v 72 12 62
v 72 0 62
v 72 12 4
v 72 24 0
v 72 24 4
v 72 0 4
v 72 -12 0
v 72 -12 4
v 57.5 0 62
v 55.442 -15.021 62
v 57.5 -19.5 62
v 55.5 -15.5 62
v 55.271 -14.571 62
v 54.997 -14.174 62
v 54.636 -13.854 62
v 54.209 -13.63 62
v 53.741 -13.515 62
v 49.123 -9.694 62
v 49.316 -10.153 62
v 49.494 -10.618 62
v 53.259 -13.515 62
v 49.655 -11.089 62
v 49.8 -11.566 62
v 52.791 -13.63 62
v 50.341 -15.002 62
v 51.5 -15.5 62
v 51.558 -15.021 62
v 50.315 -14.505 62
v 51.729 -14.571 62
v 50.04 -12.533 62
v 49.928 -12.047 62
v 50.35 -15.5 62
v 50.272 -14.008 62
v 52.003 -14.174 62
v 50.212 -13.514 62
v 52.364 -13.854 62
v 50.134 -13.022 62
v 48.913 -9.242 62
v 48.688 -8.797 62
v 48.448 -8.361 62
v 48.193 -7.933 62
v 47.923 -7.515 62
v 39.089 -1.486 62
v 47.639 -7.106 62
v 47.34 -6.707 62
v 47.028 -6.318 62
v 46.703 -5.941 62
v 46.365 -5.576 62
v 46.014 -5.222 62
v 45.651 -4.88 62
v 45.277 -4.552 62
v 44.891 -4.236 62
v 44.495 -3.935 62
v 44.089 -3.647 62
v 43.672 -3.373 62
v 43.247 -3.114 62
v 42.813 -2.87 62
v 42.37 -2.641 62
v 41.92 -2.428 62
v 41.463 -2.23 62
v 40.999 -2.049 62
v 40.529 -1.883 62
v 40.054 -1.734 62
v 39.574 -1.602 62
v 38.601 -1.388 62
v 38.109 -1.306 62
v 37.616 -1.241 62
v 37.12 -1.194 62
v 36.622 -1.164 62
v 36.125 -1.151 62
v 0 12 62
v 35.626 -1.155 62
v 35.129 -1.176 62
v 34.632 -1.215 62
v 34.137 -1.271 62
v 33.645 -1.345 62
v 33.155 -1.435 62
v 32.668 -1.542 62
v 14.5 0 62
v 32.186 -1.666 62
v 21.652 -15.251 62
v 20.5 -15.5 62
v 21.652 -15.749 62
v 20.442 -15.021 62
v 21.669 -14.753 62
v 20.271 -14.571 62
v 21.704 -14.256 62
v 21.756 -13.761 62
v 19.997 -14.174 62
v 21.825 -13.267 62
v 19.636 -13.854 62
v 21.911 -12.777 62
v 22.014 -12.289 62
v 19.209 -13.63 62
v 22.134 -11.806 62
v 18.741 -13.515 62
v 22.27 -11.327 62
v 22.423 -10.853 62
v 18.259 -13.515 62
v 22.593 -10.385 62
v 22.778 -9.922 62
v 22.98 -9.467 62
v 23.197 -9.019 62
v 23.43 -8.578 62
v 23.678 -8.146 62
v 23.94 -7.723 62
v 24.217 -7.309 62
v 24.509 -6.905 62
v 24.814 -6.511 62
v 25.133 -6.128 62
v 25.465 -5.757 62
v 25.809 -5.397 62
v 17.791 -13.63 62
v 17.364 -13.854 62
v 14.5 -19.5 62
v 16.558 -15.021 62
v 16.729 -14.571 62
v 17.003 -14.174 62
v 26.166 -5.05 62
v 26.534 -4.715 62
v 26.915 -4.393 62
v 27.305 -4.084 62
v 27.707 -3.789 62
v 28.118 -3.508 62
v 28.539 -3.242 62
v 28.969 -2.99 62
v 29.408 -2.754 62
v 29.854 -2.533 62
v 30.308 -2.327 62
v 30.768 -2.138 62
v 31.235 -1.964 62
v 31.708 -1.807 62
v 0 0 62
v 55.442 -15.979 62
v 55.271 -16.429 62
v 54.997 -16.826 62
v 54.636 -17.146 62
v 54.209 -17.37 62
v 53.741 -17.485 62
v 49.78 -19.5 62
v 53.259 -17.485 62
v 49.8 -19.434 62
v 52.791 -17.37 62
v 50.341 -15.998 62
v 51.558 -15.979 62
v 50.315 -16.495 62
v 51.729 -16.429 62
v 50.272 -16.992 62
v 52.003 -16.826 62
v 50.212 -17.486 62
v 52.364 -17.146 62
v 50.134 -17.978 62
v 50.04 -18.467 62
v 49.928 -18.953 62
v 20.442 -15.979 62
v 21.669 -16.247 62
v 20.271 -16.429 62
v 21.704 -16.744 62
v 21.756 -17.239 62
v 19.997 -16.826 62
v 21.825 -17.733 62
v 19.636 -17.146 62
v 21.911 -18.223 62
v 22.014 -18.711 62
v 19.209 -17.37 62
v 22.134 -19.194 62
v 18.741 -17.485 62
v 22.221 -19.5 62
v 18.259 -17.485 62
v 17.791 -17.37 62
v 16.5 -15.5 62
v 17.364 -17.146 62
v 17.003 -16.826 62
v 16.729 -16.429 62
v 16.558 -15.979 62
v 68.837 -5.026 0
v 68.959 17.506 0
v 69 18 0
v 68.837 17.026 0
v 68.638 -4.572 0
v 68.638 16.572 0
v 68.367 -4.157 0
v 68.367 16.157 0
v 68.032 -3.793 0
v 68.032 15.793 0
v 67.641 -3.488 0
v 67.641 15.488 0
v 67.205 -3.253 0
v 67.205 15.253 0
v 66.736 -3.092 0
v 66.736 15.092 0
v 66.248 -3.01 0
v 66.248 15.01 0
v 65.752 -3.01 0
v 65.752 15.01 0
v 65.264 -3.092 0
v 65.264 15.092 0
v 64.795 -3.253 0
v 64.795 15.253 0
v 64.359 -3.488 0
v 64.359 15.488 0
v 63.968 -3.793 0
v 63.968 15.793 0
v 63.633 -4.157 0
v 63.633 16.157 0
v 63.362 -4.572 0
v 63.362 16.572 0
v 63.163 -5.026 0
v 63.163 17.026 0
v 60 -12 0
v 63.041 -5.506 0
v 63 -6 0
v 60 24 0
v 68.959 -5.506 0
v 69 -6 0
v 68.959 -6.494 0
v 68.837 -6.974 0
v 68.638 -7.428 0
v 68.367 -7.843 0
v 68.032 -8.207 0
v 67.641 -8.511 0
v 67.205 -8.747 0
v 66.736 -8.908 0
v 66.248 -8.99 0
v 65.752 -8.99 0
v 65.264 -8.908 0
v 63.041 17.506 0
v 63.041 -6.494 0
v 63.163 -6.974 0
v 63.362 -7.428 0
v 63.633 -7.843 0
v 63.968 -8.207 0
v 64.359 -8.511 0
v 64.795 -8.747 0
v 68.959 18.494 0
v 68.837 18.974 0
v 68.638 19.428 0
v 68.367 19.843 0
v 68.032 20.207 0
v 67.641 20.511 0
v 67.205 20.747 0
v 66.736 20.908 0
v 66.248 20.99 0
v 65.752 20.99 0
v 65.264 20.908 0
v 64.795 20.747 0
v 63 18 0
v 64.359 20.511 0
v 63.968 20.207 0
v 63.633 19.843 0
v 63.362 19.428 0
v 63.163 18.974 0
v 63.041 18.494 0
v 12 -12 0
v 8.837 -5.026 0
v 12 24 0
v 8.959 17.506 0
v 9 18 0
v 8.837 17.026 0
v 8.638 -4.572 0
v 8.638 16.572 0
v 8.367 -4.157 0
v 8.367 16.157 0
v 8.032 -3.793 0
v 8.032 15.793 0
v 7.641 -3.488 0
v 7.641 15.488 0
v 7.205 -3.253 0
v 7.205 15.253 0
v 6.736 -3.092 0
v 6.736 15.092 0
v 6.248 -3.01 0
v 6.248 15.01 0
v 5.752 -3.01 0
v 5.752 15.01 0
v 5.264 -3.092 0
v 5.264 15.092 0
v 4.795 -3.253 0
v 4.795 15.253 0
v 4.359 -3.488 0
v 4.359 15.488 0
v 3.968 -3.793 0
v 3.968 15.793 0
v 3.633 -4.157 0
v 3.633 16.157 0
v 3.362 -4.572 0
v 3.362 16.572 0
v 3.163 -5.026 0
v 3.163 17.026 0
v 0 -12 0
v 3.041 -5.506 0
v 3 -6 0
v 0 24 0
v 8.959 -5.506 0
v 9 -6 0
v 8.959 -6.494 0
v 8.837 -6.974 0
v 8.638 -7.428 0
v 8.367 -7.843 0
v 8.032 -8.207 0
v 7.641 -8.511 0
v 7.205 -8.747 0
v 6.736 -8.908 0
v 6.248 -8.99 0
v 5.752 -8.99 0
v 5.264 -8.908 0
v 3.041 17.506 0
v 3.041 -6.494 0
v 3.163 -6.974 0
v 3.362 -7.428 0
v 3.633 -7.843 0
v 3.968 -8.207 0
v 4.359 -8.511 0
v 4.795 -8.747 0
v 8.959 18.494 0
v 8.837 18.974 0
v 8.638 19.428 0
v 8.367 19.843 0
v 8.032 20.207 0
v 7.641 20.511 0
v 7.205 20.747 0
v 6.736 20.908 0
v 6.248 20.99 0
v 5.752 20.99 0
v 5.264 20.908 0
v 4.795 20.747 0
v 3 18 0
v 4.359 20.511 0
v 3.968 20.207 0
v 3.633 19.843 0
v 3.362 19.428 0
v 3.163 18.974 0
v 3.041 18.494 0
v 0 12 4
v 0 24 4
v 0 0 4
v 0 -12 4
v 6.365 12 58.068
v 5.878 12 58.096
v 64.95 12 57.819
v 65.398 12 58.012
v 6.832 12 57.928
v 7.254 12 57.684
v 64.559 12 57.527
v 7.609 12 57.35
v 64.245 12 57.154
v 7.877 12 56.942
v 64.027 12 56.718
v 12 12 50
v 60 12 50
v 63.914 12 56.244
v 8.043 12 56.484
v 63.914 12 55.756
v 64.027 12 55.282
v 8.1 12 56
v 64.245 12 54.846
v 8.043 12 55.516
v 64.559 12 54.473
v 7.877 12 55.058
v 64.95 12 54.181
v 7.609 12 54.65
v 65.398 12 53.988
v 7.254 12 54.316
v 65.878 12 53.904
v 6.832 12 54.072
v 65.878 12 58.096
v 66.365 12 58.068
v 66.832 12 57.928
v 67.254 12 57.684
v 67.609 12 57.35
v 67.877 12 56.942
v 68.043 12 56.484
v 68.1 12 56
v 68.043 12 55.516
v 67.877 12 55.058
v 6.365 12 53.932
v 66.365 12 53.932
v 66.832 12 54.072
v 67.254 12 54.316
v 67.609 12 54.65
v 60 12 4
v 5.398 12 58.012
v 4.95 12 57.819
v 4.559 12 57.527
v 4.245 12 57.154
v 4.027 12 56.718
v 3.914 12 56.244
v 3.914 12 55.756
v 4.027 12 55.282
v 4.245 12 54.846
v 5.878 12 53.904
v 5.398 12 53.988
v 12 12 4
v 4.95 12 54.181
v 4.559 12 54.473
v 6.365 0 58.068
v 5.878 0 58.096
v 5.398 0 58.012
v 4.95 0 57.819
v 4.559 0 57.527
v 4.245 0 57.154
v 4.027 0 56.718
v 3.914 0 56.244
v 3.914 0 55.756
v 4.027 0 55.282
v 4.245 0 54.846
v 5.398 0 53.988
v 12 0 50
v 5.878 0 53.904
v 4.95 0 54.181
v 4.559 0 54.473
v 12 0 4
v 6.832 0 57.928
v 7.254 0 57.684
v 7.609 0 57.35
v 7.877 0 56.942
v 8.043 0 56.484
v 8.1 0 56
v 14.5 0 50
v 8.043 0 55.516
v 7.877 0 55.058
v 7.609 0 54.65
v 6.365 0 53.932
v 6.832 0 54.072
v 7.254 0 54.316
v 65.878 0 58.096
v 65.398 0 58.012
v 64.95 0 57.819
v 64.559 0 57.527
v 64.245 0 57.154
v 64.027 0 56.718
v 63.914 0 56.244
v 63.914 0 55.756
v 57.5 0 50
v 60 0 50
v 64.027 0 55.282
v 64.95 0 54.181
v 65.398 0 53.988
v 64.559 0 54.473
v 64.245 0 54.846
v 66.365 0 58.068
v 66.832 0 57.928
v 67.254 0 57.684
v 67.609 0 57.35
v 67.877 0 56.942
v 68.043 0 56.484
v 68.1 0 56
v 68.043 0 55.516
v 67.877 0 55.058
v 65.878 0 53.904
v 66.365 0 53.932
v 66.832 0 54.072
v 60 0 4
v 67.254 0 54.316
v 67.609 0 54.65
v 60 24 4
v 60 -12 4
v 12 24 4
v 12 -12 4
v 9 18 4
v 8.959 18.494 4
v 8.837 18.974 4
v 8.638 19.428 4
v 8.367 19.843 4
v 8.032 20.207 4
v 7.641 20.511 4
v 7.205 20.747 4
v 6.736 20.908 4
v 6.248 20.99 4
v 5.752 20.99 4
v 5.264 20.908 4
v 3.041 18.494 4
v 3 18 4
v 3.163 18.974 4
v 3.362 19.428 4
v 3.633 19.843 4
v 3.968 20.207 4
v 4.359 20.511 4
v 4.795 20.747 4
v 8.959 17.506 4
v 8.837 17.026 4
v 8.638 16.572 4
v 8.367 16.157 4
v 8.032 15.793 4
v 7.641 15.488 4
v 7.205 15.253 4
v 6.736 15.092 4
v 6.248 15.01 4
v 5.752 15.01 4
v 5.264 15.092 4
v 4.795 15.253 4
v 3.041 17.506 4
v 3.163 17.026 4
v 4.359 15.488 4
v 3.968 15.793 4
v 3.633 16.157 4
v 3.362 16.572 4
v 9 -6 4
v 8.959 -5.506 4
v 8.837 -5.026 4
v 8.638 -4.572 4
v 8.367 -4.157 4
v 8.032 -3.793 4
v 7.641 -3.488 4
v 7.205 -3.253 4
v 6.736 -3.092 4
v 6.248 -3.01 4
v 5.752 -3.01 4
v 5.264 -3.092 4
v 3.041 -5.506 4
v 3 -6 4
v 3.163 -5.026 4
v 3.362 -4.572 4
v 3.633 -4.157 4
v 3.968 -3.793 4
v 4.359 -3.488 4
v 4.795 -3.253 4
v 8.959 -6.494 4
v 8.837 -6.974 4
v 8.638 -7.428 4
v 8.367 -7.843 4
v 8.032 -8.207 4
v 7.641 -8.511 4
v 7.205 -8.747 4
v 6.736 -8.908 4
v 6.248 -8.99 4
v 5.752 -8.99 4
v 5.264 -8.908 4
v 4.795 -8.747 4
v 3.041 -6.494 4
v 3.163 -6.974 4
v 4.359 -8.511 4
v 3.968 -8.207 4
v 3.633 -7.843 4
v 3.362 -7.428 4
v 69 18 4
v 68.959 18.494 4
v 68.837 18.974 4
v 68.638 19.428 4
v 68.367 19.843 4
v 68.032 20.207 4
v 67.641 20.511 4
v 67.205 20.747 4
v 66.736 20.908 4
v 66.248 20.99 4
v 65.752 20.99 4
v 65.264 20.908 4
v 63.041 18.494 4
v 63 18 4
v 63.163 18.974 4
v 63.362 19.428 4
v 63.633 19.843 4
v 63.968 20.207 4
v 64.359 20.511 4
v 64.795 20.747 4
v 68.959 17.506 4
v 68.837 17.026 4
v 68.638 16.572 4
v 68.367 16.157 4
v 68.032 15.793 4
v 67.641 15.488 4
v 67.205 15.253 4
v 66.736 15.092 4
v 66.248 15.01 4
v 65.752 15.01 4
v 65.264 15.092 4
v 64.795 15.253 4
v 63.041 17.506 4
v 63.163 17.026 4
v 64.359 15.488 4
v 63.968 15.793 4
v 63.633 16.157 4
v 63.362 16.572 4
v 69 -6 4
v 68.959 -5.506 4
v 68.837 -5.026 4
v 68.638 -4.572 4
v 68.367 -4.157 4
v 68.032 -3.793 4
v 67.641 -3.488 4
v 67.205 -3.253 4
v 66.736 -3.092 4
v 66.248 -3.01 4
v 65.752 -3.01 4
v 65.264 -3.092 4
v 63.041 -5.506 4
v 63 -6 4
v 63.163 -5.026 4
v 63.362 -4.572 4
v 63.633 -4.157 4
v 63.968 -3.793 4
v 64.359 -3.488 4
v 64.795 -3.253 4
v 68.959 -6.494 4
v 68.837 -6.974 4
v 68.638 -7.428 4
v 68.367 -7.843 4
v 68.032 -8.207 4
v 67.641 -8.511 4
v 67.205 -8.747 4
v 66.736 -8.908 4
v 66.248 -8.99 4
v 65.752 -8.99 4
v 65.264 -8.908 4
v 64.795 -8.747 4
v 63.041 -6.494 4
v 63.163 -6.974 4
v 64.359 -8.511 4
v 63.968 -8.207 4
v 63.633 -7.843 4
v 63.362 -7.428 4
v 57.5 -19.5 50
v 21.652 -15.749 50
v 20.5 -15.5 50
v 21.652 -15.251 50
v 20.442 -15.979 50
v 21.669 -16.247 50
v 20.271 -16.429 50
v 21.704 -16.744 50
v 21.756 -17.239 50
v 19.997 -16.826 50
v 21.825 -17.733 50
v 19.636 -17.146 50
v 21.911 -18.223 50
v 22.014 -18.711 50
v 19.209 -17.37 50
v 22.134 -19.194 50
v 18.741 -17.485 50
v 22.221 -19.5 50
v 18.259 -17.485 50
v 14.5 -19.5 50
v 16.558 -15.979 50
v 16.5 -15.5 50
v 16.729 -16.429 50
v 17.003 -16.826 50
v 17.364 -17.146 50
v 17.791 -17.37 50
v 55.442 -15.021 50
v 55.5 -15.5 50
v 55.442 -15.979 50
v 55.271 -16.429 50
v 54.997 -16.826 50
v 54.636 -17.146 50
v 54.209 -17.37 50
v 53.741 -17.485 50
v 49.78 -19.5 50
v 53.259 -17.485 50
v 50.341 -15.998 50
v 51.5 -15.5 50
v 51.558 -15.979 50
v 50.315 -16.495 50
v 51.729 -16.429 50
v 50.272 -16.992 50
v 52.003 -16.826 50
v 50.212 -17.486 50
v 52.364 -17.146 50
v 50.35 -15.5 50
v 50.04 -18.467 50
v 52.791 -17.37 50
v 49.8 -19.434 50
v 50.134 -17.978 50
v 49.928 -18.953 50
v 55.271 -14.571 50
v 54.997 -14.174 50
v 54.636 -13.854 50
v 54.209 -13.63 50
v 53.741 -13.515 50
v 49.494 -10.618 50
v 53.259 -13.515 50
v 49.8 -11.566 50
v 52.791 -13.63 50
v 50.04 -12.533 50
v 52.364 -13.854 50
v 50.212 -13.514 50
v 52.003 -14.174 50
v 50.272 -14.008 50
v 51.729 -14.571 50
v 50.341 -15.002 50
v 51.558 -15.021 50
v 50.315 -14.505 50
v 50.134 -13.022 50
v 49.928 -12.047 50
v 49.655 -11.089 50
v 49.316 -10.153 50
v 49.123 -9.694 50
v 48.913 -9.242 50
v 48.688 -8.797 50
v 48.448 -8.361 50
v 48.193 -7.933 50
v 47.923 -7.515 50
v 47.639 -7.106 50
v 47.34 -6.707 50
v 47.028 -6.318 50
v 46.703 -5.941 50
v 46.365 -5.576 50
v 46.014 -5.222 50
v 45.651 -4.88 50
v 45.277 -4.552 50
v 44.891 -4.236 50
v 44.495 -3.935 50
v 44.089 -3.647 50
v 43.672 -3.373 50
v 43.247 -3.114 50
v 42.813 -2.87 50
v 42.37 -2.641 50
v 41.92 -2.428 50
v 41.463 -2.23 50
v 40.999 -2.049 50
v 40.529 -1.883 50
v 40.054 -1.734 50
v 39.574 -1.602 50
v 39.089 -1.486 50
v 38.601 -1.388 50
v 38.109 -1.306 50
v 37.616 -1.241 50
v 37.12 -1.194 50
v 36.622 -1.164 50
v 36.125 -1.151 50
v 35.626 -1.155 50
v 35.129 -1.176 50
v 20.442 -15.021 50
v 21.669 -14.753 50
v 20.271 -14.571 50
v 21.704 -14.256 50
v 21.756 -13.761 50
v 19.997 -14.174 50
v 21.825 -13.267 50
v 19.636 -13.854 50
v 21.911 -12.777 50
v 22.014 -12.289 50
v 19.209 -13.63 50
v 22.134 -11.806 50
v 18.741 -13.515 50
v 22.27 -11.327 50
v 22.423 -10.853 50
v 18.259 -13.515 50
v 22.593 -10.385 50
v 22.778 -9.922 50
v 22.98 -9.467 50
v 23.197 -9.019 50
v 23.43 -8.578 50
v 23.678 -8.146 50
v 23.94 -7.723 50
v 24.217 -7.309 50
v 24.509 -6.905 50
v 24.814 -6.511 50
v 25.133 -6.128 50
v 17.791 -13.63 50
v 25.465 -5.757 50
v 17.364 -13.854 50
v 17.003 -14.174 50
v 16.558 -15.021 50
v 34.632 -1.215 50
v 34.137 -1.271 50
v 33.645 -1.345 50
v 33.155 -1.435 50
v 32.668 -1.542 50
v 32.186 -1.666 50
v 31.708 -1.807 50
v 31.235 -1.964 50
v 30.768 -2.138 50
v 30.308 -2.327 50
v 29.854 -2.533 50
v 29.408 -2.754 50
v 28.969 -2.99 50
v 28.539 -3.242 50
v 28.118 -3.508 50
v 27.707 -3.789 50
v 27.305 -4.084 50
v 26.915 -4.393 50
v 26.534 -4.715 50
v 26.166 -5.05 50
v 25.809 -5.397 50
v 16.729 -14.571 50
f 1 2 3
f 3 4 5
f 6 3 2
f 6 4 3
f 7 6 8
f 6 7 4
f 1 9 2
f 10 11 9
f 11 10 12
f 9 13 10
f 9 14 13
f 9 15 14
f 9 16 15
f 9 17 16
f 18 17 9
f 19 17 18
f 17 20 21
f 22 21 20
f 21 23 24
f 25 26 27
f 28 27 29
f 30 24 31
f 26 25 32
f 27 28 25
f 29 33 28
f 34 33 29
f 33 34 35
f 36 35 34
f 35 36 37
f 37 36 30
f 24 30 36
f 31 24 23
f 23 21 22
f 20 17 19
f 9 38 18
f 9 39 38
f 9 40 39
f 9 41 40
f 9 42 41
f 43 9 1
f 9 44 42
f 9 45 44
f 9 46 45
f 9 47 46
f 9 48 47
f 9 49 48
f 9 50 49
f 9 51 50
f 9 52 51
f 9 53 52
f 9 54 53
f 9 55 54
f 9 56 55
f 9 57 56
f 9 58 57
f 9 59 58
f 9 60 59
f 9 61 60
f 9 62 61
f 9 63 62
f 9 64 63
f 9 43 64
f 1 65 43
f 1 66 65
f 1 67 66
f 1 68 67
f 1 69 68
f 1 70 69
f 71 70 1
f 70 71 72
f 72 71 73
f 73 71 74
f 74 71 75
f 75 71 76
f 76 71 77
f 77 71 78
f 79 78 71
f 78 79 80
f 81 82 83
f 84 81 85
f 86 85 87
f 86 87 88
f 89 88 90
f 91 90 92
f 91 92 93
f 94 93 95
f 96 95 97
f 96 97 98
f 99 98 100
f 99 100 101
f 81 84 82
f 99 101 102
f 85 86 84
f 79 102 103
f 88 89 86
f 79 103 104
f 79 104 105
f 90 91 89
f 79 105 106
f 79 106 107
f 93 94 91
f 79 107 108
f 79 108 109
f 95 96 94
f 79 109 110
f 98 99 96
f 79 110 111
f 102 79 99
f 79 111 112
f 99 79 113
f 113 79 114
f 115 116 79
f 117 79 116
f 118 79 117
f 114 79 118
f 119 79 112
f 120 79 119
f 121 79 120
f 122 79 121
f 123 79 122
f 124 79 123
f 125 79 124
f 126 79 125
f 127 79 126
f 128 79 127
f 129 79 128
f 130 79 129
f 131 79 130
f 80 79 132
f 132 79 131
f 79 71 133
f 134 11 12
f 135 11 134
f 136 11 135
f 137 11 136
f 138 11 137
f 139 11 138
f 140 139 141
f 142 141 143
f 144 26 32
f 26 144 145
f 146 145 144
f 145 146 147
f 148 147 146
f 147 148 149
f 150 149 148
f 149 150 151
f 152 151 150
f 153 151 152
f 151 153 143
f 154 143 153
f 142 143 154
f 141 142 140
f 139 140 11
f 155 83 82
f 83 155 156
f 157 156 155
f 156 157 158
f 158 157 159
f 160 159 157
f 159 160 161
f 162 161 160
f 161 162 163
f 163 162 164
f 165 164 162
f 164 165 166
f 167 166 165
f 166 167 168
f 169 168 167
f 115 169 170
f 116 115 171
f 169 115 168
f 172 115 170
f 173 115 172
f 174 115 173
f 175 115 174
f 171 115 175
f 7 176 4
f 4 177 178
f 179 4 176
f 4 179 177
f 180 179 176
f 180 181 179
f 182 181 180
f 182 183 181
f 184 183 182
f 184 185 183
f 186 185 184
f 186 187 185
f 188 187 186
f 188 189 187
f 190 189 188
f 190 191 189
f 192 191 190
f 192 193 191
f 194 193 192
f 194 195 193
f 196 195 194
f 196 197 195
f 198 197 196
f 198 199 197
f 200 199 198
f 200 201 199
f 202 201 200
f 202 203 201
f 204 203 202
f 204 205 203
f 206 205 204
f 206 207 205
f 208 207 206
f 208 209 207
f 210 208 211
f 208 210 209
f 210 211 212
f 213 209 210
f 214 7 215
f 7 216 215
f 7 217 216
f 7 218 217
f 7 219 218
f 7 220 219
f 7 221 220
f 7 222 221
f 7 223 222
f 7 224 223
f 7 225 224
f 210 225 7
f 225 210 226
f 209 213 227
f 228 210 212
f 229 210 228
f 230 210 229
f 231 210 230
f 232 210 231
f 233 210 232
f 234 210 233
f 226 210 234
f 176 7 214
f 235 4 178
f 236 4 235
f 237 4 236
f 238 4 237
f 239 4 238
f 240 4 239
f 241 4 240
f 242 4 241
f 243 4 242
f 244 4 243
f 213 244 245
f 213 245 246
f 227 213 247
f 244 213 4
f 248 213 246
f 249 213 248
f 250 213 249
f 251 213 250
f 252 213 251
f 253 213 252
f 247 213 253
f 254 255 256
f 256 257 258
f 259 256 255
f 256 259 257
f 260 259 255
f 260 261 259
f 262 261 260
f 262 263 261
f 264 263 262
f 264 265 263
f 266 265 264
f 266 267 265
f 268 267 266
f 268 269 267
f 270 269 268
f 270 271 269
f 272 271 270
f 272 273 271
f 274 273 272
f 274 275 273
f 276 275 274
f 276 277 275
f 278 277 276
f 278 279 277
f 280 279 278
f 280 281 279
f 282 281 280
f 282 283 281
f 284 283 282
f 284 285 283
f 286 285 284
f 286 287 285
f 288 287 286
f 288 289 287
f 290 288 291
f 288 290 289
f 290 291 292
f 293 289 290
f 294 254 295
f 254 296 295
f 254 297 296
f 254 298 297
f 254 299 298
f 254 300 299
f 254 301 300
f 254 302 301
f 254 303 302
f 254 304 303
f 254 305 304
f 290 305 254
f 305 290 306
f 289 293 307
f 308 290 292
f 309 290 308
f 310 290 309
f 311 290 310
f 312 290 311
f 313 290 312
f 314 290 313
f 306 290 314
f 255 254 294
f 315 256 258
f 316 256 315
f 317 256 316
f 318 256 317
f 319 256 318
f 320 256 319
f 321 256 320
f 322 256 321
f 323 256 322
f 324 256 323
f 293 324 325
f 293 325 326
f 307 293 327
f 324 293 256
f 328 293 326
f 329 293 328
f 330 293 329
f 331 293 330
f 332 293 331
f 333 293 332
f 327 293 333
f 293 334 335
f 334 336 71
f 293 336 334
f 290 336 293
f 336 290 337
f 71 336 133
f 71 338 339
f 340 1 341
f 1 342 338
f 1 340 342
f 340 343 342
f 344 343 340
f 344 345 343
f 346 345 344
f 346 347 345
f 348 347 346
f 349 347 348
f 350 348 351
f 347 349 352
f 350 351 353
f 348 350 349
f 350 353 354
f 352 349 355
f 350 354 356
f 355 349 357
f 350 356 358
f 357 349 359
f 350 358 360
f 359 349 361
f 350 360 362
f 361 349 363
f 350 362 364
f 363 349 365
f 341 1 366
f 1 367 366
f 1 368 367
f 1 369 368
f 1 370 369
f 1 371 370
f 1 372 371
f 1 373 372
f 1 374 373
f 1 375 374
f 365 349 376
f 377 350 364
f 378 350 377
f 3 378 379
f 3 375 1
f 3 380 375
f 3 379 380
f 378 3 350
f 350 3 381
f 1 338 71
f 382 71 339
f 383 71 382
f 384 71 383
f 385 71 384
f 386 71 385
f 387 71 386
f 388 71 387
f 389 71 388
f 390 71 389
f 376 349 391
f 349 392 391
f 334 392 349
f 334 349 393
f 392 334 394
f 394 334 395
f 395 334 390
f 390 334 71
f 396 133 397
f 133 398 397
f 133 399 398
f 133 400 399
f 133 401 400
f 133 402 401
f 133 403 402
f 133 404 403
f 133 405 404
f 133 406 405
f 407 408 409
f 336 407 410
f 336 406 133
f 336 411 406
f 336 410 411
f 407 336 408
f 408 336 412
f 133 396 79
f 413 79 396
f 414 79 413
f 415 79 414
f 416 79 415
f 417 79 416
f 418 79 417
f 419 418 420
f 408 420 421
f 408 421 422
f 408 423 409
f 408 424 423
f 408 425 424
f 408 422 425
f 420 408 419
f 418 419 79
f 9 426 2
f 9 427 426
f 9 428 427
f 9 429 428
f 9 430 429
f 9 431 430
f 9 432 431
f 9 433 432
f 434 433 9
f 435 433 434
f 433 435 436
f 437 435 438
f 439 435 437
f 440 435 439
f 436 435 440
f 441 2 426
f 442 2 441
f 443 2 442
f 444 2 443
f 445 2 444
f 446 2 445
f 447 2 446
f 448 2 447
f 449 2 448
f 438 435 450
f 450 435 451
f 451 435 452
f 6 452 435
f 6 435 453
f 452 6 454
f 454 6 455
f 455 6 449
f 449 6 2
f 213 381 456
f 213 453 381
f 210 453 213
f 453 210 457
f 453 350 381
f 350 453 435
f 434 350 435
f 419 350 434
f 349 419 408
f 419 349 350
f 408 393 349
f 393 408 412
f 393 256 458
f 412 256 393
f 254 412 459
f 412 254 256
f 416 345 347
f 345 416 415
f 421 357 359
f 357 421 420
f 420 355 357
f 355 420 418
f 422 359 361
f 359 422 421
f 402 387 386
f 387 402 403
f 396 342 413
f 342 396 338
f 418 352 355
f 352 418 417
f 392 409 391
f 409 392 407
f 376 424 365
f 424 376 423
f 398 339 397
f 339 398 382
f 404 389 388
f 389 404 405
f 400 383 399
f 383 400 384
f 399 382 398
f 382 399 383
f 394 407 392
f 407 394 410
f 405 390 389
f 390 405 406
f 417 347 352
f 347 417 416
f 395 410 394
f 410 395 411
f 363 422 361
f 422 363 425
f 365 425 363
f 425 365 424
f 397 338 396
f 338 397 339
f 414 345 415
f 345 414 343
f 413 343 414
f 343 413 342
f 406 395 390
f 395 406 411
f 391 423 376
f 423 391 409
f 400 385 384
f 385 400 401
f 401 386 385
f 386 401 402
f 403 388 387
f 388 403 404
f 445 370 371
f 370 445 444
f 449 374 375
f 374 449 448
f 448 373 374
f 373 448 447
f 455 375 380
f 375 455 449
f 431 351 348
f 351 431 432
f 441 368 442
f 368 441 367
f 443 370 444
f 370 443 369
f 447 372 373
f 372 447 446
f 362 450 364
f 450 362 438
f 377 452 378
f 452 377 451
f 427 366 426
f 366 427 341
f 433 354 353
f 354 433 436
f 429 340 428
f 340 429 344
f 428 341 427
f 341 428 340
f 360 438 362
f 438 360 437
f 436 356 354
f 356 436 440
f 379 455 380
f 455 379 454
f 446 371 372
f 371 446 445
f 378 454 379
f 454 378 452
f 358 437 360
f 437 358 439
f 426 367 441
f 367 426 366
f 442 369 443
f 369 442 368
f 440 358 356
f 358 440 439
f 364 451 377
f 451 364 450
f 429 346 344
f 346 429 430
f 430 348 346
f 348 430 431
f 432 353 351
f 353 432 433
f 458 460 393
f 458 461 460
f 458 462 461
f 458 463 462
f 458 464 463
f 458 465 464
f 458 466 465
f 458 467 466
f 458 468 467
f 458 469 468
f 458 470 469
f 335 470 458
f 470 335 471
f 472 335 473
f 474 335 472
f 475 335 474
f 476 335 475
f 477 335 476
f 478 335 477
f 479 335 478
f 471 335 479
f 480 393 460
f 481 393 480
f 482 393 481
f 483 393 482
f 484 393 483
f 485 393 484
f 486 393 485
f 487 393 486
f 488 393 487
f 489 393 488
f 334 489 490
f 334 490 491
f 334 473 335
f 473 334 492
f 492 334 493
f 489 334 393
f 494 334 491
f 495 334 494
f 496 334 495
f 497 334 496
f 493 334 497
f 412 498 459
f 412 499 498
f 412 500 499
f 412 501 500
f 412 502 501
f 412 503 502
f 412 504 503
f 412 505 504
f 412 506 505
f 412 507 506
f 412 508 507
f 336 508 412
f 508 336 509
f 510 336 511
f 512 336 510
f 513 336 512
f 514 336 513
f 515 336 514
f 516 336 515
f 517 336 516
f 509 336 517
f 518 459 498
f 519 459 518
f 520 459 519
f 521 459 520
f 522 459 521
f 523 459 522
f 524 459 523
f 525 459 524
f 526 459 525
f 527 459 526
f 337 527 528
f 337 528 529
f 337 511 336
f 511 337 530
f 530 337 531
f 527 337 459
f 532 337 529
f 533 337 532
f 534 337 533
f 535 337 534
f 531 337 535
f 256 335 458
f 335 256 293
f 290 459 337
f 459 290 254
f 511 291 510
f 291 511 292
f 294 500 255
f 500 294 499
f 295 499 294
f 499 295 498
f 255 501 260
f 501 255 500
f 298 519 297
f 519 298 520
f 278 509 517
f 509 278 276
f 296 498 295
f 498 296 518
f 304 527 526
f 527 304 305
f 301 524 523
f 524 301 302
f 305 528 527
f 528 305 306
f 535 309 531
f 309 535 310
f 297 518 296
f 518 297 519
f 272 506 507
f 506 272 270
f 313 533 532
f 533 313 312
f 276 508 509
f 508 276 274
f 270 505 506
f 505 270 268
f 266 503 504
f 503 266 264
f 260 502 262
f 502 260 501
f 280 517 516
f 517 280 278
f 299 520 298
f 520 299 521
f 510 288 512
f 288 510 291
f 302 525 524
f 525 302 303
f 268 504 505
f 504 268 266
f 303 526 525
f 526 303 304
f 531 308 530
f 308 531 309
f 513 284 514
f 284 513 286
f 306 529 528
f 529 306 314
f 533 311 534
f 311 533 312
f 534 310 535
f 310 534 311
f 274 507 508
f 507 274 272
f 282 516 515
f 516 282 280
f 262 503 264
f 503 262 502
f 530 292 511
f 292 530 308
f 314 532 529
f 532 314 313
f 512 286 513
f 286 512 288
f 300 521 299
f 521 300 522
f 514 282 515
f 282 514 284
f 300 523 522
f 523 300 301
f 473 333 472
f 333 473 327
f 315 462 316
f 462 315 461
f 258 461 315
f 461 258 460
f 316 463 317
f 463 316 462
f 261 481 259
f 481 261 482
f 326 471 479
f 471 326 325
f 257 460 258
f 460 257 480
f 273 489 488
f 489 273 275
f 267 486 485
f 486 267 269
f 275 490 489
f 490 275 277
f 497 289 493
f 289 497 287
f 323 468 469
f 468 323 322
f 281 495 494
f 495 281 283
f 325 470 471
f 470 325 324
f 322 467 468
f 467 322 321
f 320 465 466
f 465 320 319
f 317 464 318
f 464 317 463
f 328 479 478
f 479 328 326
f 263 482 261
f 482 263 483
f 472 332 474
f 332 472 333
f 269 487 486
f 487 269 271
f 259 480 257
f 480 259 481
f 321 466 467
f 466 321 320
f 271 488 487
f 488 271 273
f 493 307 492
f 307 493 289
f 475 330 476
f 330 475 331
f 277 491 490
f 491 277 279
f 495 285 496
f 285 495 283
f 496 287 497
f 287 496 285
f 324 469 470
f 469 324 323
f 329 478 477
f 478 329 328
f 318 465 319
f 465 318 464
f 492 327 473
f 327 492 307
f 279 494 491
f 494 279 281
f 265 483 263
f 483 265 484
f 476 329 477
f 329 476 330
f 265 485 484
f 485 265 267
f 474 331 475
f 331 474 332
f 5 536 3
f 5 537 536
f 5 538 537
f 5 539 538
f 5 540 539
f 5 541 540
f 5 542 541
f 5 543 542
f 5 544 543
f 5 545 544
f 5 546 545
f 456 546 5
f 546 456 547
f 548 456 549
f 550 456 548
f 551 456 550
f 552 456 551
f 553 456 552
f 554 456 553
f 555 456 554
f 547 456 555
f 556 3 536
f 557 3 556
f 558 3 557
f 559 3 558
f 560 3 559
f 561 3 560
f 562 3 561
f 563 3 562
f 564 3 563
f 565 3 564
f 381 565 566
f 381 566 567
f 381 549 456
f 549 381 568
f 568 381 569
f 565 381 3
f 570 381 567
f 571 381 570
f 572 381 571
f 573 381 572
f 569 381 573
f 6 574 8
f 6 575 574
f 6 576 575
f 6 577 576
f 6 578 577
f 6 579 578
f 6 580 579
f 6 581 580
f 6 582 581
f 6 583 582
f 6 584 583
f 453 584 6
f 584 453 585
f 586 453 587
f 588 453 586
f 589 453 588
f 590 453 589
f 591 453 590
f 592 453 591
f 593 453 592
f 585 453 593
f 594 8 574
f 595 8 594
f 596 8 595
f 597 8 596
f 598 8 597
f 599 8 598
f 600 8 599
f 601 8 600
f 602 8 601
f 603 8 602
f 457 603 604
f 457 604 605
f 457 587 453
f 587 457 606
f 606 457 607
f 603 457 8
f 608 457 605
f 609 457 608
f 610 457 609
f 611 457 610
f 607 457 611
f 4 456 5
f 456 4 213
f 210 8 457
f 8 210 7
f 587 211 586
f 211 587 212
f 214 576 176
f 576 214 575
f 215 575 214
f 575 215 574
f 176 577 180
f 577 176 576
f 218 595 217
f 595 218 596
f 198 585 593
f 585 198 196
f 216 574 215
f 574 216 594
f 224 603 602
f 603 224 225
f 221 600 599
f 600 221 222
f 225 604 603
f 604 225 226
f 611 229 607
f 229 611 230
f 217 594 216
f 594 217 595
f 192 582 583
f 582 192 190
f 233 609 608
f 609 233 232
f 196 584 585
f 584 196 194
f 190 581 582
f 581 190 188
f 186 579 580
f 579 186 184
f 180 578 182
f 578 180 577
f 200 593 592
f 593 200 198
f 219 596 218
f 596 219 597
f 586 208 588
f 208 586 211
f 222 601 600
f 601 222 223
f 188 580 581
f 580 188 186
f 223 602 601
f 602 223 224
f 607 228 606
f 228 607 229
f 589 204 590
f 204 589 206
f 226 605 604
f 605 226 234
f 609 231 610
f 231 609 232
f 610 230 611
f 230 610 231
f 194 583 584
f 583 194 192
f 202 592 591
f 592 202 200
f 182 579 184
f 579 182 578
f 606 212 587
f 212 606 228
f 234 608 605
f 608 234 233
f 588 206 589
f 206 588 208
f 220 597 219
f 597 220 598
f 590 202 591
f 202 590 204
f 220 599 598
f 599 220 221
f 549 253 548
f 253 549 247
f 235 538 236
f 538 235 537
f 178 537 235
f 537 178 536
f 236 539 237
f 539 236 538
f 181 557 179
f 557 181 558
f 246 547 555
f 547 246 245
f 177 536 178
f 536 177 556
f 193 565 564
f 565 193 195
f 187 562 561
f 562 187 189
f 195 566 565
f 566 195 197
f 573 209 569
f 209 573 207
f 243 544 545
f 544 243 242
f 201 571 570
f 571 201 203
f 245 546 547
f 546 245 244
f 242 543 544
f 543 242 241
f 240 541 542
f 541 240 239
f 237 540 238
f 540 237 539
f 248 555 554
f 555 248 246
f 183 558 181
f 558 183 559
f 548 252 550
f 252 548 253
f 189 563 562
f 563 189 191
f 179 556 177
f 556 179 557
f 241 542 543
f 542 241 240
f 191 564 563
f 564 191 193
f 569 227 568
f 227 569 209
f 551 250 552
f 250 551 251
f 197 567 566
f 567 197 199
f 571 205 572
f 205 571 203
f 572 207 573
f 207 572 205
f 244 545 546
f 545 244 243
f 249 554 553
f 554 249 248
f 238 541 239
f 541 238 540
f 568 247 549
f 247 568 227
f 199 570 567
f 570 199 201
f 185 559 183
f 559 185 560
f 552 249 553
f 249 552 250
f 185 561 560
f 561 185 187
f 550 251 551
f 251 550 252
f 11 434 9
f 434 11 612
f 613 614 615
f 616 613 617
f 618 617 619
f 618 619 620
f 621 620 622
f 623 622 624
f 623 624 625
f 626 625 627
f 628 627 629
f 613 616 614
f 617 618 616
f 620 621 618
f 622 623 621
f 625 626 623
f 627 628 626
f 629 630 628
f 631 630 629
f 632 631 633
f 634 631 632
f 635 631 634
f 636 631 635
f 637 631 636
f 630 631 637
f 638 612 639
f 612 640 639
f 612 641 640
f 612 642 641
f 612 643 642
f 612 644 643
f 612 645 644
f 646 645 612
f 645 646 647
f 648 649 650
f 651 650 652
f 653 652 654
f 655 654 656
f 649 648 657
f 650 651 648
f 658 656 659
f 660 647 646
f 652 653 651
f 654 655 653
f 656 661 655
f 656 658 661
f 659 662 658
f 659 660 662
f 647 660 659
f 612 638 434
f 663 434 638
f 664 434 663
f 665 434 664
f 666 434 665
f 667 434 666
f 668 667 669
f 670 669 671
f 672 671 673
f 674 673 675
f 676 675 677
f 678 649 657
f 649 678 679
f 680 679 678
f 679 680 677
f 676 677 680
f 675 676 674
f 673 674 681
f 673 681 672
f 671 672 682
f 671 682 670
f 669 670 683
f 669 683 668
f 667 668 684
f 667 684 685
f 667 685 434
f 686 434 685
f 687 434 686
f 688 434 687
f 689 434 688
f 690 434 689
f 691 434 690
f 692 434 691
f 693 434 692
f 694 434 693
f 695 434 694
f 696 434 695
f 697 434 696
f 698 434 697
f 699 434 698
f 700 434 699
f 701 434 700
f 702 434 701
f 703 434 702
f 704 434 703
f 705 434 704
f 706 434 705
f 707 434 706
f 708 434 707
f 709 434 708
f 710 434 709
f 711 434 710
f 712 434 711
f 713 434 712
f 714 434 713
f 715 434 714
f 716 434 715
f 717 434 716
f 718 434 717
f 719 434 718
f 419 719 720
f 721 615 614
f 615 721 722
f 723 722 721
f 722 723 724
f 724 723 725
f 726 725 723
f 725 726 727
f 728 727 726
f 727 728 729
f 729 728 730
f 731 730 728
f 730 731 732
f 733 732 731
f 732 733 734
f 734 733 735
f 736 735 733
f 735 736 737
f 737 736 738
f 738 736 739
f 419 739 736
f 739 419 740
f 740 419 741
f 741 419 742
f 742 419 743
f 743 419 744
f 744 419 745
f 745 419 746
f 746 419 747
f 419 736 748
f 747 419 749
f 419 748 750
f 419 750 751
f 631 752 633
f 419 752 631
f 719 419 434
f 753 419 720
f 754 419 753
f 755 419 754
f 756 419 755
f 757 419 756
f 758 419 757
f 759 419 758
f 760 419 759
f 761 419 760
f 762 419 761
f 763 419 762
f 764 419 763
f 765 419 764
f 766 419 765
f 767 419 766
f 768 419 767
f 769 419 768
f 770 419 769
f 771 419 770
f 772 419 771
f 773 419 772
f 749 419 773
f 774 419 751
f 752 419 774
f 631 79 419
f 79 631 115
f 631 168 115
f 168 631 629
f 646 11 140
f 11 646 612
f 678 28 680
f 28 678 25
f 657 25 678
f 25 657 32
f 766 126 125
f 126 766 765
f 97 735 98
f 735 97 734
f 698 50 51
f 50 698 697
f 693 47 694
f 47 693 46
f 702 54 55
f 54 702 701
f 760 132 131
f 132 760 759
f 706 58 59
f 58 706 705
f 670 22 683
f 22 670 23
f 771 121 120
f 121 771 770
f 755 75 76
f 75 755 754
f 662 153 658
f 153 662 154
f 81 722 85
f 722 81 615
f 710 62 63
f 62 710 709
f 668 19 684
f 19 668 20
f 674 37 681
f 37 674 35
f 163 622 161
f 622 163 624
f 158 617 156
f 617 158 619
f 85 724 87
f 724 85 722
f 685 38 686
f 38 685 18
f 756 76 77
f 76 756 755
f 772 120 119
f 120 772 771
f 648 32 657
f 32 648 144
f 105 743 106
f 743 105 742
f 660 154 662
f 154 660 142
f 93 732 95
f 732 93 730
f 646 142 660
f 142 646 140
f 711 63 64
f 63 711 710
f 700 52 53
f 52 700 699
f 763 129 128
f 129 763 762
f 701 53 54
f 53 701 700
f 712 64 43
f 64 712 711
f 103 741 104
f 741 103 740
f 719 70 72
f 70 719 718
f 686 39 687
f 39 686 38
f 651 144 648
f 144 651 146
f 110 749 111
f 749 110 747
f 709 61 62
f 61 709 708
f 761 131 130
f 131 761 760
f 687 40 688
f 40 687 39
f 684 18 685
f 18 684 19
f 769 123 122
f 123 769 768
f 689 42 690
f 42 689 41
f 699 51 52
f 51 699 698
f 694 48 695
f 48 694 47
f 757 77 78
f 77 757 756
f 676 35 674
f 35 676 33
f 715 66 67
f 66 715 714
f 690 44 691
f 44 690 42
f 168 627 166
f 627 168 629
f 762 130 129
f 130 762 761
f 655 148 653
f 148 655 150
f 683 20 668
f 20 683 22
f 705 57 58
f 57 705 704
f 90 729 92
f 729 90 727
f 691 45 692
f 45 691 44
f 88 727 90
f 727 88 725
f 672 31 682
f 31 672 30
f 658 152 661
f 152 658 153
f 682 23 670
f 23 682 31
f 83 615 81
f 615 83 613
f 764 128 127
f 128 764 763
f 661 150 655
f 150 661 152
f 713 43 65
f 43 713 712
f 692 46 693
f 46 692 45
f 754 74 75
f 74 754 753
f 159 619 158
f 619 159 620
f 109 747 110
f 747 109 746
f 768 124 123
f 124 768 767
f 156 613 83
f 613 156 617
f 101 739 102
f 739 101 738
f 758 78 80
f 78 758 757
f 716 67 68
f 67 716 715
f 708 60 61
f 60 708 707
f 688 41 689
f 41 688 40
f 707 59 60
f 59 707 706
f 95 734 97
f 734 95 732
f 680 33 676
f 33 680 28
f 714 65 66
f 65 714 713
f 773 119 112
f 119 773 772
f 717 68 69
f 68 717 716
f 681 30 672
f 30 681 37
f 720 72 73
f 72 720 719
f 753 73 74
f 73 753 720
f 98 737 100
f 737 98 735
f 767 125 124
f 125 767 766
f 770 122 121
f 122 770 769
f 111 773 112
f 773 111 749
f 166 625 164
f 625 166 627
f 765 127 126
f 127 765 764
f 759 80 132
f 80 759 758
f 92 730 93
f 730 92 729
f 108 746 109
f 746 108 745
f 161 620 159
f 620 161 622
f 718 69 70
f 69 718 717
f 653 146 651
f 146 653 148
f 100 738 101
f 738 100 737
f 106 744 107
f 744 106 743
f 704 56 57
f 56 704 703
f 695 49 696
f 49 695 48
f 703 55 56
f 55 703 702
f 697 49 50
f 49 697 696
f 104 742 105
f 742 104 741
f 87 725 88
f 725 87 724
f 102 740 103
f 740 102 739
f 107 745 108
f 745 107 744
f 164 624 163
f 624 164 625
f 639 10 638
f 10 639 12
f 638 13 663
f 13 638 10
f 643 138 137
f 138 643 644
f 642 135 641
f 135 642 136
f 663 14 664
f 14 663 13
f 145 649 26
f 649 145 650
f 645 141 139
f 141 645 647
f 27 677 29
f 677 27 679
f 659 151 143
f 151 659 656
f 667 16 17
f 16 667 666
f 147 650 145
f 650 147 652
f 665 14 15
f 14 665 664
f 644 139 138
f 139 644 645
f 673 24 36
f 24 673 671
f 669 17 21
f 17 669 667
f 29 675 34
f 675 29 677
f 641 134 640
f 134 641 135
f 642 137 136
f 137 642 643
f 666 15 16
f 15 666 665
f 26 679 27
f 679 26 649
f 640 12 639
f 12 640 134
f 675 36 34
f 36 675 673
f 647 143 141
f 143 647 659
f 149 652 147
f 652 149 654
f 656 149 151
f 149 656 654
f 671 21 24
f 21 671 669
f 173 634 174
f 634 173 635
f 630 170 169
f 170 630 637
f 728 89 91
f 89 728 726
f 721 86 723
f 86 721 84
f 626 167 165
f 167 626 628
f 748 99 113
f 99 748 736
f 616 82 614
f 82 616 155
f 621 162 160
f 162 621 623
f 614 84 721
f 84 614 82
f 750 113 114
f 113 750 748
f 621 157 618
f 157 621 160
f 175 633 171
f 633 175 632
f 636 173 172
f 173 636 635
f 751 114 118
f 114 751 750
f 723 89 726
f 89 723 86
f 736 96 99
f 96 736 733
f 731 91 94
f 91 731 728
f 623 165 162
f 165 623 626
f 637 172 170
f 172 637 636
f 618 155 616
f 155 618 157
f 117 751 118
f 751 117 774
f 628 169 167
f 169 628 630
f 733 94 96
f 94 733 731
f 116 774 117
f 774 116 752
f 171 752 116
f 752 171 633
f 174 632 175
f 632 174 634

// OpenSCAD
module MotorMount(border_width=2, height=10, fit_factor=1.025) {
    // Motor Specifications
    motor_diameter=28;
    motor_height=20;
    hole_position=17.5;
    hole_radius=2;
    bracket_width=7;
    // Mount Definition
    translate([0,bracket_width/2,0])
    difference() {
        translate([-(hole_position+hole_radius+border_width),
            -hole_radius-border_width,0]) 
            cube([2*(hole_position+hole_radius+border_width),
                motor_diameter/2+bracket_width/2+border_width,height]);
        translate([0,0,-1]) cylinder(r=fit_factor*motor_diameter/2, h=motor_height);
        translate([hole_position, 0, -1]) cylinder(r=hole_radius, h=height+2);
        translate([-hole_position, 0, -1]) cylinder(r=hole_radius, h=height+2);
    }
}

module Structure(rod_separation=60, rod_radius=2,thickness=12, fit_factor=1.05) {
    motor_height=50;
    // foot pads module
    module FootPad(h=4) {
        difference() {
            translate([0,-thickness,0]) cube([thickness, 3*thickness, h]);
            translate([thickness/2, -thickness/2, -1]) 
                cylinder(r=thickness/4, h=h+2);
            translate([thickness/2, 3*thickness/2, -1]) 
                cylinder(r=thickness/4, h=h+2);
        }
    }
    
    // main structure
    difference() {
        cube([rod_separation+thickness, thickness, motor_height+thickness]);
        
        // under gap
        translate([thickness,-1,-1])
        cube([rod_separation-thickness,thickness+2, motor_height+1]);
        
        // rod holes
        translate([thickness/2, -1, motor_height+thickness/2]) 
        rotate([-90,0,0]) cylinder(r=fit_factor*rod_radius, h=thickness+2);
        translate([thickness/2+rod_separation, -1, motor_height+thickness/2]) 
        rotate([-90,0,0]) cylinder(r=fit_factor*rod_radius, h=thickness+2);
    }
    
    FootPad();
    translate([rod_separation, 0, 0]) FootPad();
}

module MotorAndRodMount() {
    Structure();
    translate([36, -19, 50]) MotorMount(height=12);
}

MotorAndRodMount($fs=.5, $fa=.5);
